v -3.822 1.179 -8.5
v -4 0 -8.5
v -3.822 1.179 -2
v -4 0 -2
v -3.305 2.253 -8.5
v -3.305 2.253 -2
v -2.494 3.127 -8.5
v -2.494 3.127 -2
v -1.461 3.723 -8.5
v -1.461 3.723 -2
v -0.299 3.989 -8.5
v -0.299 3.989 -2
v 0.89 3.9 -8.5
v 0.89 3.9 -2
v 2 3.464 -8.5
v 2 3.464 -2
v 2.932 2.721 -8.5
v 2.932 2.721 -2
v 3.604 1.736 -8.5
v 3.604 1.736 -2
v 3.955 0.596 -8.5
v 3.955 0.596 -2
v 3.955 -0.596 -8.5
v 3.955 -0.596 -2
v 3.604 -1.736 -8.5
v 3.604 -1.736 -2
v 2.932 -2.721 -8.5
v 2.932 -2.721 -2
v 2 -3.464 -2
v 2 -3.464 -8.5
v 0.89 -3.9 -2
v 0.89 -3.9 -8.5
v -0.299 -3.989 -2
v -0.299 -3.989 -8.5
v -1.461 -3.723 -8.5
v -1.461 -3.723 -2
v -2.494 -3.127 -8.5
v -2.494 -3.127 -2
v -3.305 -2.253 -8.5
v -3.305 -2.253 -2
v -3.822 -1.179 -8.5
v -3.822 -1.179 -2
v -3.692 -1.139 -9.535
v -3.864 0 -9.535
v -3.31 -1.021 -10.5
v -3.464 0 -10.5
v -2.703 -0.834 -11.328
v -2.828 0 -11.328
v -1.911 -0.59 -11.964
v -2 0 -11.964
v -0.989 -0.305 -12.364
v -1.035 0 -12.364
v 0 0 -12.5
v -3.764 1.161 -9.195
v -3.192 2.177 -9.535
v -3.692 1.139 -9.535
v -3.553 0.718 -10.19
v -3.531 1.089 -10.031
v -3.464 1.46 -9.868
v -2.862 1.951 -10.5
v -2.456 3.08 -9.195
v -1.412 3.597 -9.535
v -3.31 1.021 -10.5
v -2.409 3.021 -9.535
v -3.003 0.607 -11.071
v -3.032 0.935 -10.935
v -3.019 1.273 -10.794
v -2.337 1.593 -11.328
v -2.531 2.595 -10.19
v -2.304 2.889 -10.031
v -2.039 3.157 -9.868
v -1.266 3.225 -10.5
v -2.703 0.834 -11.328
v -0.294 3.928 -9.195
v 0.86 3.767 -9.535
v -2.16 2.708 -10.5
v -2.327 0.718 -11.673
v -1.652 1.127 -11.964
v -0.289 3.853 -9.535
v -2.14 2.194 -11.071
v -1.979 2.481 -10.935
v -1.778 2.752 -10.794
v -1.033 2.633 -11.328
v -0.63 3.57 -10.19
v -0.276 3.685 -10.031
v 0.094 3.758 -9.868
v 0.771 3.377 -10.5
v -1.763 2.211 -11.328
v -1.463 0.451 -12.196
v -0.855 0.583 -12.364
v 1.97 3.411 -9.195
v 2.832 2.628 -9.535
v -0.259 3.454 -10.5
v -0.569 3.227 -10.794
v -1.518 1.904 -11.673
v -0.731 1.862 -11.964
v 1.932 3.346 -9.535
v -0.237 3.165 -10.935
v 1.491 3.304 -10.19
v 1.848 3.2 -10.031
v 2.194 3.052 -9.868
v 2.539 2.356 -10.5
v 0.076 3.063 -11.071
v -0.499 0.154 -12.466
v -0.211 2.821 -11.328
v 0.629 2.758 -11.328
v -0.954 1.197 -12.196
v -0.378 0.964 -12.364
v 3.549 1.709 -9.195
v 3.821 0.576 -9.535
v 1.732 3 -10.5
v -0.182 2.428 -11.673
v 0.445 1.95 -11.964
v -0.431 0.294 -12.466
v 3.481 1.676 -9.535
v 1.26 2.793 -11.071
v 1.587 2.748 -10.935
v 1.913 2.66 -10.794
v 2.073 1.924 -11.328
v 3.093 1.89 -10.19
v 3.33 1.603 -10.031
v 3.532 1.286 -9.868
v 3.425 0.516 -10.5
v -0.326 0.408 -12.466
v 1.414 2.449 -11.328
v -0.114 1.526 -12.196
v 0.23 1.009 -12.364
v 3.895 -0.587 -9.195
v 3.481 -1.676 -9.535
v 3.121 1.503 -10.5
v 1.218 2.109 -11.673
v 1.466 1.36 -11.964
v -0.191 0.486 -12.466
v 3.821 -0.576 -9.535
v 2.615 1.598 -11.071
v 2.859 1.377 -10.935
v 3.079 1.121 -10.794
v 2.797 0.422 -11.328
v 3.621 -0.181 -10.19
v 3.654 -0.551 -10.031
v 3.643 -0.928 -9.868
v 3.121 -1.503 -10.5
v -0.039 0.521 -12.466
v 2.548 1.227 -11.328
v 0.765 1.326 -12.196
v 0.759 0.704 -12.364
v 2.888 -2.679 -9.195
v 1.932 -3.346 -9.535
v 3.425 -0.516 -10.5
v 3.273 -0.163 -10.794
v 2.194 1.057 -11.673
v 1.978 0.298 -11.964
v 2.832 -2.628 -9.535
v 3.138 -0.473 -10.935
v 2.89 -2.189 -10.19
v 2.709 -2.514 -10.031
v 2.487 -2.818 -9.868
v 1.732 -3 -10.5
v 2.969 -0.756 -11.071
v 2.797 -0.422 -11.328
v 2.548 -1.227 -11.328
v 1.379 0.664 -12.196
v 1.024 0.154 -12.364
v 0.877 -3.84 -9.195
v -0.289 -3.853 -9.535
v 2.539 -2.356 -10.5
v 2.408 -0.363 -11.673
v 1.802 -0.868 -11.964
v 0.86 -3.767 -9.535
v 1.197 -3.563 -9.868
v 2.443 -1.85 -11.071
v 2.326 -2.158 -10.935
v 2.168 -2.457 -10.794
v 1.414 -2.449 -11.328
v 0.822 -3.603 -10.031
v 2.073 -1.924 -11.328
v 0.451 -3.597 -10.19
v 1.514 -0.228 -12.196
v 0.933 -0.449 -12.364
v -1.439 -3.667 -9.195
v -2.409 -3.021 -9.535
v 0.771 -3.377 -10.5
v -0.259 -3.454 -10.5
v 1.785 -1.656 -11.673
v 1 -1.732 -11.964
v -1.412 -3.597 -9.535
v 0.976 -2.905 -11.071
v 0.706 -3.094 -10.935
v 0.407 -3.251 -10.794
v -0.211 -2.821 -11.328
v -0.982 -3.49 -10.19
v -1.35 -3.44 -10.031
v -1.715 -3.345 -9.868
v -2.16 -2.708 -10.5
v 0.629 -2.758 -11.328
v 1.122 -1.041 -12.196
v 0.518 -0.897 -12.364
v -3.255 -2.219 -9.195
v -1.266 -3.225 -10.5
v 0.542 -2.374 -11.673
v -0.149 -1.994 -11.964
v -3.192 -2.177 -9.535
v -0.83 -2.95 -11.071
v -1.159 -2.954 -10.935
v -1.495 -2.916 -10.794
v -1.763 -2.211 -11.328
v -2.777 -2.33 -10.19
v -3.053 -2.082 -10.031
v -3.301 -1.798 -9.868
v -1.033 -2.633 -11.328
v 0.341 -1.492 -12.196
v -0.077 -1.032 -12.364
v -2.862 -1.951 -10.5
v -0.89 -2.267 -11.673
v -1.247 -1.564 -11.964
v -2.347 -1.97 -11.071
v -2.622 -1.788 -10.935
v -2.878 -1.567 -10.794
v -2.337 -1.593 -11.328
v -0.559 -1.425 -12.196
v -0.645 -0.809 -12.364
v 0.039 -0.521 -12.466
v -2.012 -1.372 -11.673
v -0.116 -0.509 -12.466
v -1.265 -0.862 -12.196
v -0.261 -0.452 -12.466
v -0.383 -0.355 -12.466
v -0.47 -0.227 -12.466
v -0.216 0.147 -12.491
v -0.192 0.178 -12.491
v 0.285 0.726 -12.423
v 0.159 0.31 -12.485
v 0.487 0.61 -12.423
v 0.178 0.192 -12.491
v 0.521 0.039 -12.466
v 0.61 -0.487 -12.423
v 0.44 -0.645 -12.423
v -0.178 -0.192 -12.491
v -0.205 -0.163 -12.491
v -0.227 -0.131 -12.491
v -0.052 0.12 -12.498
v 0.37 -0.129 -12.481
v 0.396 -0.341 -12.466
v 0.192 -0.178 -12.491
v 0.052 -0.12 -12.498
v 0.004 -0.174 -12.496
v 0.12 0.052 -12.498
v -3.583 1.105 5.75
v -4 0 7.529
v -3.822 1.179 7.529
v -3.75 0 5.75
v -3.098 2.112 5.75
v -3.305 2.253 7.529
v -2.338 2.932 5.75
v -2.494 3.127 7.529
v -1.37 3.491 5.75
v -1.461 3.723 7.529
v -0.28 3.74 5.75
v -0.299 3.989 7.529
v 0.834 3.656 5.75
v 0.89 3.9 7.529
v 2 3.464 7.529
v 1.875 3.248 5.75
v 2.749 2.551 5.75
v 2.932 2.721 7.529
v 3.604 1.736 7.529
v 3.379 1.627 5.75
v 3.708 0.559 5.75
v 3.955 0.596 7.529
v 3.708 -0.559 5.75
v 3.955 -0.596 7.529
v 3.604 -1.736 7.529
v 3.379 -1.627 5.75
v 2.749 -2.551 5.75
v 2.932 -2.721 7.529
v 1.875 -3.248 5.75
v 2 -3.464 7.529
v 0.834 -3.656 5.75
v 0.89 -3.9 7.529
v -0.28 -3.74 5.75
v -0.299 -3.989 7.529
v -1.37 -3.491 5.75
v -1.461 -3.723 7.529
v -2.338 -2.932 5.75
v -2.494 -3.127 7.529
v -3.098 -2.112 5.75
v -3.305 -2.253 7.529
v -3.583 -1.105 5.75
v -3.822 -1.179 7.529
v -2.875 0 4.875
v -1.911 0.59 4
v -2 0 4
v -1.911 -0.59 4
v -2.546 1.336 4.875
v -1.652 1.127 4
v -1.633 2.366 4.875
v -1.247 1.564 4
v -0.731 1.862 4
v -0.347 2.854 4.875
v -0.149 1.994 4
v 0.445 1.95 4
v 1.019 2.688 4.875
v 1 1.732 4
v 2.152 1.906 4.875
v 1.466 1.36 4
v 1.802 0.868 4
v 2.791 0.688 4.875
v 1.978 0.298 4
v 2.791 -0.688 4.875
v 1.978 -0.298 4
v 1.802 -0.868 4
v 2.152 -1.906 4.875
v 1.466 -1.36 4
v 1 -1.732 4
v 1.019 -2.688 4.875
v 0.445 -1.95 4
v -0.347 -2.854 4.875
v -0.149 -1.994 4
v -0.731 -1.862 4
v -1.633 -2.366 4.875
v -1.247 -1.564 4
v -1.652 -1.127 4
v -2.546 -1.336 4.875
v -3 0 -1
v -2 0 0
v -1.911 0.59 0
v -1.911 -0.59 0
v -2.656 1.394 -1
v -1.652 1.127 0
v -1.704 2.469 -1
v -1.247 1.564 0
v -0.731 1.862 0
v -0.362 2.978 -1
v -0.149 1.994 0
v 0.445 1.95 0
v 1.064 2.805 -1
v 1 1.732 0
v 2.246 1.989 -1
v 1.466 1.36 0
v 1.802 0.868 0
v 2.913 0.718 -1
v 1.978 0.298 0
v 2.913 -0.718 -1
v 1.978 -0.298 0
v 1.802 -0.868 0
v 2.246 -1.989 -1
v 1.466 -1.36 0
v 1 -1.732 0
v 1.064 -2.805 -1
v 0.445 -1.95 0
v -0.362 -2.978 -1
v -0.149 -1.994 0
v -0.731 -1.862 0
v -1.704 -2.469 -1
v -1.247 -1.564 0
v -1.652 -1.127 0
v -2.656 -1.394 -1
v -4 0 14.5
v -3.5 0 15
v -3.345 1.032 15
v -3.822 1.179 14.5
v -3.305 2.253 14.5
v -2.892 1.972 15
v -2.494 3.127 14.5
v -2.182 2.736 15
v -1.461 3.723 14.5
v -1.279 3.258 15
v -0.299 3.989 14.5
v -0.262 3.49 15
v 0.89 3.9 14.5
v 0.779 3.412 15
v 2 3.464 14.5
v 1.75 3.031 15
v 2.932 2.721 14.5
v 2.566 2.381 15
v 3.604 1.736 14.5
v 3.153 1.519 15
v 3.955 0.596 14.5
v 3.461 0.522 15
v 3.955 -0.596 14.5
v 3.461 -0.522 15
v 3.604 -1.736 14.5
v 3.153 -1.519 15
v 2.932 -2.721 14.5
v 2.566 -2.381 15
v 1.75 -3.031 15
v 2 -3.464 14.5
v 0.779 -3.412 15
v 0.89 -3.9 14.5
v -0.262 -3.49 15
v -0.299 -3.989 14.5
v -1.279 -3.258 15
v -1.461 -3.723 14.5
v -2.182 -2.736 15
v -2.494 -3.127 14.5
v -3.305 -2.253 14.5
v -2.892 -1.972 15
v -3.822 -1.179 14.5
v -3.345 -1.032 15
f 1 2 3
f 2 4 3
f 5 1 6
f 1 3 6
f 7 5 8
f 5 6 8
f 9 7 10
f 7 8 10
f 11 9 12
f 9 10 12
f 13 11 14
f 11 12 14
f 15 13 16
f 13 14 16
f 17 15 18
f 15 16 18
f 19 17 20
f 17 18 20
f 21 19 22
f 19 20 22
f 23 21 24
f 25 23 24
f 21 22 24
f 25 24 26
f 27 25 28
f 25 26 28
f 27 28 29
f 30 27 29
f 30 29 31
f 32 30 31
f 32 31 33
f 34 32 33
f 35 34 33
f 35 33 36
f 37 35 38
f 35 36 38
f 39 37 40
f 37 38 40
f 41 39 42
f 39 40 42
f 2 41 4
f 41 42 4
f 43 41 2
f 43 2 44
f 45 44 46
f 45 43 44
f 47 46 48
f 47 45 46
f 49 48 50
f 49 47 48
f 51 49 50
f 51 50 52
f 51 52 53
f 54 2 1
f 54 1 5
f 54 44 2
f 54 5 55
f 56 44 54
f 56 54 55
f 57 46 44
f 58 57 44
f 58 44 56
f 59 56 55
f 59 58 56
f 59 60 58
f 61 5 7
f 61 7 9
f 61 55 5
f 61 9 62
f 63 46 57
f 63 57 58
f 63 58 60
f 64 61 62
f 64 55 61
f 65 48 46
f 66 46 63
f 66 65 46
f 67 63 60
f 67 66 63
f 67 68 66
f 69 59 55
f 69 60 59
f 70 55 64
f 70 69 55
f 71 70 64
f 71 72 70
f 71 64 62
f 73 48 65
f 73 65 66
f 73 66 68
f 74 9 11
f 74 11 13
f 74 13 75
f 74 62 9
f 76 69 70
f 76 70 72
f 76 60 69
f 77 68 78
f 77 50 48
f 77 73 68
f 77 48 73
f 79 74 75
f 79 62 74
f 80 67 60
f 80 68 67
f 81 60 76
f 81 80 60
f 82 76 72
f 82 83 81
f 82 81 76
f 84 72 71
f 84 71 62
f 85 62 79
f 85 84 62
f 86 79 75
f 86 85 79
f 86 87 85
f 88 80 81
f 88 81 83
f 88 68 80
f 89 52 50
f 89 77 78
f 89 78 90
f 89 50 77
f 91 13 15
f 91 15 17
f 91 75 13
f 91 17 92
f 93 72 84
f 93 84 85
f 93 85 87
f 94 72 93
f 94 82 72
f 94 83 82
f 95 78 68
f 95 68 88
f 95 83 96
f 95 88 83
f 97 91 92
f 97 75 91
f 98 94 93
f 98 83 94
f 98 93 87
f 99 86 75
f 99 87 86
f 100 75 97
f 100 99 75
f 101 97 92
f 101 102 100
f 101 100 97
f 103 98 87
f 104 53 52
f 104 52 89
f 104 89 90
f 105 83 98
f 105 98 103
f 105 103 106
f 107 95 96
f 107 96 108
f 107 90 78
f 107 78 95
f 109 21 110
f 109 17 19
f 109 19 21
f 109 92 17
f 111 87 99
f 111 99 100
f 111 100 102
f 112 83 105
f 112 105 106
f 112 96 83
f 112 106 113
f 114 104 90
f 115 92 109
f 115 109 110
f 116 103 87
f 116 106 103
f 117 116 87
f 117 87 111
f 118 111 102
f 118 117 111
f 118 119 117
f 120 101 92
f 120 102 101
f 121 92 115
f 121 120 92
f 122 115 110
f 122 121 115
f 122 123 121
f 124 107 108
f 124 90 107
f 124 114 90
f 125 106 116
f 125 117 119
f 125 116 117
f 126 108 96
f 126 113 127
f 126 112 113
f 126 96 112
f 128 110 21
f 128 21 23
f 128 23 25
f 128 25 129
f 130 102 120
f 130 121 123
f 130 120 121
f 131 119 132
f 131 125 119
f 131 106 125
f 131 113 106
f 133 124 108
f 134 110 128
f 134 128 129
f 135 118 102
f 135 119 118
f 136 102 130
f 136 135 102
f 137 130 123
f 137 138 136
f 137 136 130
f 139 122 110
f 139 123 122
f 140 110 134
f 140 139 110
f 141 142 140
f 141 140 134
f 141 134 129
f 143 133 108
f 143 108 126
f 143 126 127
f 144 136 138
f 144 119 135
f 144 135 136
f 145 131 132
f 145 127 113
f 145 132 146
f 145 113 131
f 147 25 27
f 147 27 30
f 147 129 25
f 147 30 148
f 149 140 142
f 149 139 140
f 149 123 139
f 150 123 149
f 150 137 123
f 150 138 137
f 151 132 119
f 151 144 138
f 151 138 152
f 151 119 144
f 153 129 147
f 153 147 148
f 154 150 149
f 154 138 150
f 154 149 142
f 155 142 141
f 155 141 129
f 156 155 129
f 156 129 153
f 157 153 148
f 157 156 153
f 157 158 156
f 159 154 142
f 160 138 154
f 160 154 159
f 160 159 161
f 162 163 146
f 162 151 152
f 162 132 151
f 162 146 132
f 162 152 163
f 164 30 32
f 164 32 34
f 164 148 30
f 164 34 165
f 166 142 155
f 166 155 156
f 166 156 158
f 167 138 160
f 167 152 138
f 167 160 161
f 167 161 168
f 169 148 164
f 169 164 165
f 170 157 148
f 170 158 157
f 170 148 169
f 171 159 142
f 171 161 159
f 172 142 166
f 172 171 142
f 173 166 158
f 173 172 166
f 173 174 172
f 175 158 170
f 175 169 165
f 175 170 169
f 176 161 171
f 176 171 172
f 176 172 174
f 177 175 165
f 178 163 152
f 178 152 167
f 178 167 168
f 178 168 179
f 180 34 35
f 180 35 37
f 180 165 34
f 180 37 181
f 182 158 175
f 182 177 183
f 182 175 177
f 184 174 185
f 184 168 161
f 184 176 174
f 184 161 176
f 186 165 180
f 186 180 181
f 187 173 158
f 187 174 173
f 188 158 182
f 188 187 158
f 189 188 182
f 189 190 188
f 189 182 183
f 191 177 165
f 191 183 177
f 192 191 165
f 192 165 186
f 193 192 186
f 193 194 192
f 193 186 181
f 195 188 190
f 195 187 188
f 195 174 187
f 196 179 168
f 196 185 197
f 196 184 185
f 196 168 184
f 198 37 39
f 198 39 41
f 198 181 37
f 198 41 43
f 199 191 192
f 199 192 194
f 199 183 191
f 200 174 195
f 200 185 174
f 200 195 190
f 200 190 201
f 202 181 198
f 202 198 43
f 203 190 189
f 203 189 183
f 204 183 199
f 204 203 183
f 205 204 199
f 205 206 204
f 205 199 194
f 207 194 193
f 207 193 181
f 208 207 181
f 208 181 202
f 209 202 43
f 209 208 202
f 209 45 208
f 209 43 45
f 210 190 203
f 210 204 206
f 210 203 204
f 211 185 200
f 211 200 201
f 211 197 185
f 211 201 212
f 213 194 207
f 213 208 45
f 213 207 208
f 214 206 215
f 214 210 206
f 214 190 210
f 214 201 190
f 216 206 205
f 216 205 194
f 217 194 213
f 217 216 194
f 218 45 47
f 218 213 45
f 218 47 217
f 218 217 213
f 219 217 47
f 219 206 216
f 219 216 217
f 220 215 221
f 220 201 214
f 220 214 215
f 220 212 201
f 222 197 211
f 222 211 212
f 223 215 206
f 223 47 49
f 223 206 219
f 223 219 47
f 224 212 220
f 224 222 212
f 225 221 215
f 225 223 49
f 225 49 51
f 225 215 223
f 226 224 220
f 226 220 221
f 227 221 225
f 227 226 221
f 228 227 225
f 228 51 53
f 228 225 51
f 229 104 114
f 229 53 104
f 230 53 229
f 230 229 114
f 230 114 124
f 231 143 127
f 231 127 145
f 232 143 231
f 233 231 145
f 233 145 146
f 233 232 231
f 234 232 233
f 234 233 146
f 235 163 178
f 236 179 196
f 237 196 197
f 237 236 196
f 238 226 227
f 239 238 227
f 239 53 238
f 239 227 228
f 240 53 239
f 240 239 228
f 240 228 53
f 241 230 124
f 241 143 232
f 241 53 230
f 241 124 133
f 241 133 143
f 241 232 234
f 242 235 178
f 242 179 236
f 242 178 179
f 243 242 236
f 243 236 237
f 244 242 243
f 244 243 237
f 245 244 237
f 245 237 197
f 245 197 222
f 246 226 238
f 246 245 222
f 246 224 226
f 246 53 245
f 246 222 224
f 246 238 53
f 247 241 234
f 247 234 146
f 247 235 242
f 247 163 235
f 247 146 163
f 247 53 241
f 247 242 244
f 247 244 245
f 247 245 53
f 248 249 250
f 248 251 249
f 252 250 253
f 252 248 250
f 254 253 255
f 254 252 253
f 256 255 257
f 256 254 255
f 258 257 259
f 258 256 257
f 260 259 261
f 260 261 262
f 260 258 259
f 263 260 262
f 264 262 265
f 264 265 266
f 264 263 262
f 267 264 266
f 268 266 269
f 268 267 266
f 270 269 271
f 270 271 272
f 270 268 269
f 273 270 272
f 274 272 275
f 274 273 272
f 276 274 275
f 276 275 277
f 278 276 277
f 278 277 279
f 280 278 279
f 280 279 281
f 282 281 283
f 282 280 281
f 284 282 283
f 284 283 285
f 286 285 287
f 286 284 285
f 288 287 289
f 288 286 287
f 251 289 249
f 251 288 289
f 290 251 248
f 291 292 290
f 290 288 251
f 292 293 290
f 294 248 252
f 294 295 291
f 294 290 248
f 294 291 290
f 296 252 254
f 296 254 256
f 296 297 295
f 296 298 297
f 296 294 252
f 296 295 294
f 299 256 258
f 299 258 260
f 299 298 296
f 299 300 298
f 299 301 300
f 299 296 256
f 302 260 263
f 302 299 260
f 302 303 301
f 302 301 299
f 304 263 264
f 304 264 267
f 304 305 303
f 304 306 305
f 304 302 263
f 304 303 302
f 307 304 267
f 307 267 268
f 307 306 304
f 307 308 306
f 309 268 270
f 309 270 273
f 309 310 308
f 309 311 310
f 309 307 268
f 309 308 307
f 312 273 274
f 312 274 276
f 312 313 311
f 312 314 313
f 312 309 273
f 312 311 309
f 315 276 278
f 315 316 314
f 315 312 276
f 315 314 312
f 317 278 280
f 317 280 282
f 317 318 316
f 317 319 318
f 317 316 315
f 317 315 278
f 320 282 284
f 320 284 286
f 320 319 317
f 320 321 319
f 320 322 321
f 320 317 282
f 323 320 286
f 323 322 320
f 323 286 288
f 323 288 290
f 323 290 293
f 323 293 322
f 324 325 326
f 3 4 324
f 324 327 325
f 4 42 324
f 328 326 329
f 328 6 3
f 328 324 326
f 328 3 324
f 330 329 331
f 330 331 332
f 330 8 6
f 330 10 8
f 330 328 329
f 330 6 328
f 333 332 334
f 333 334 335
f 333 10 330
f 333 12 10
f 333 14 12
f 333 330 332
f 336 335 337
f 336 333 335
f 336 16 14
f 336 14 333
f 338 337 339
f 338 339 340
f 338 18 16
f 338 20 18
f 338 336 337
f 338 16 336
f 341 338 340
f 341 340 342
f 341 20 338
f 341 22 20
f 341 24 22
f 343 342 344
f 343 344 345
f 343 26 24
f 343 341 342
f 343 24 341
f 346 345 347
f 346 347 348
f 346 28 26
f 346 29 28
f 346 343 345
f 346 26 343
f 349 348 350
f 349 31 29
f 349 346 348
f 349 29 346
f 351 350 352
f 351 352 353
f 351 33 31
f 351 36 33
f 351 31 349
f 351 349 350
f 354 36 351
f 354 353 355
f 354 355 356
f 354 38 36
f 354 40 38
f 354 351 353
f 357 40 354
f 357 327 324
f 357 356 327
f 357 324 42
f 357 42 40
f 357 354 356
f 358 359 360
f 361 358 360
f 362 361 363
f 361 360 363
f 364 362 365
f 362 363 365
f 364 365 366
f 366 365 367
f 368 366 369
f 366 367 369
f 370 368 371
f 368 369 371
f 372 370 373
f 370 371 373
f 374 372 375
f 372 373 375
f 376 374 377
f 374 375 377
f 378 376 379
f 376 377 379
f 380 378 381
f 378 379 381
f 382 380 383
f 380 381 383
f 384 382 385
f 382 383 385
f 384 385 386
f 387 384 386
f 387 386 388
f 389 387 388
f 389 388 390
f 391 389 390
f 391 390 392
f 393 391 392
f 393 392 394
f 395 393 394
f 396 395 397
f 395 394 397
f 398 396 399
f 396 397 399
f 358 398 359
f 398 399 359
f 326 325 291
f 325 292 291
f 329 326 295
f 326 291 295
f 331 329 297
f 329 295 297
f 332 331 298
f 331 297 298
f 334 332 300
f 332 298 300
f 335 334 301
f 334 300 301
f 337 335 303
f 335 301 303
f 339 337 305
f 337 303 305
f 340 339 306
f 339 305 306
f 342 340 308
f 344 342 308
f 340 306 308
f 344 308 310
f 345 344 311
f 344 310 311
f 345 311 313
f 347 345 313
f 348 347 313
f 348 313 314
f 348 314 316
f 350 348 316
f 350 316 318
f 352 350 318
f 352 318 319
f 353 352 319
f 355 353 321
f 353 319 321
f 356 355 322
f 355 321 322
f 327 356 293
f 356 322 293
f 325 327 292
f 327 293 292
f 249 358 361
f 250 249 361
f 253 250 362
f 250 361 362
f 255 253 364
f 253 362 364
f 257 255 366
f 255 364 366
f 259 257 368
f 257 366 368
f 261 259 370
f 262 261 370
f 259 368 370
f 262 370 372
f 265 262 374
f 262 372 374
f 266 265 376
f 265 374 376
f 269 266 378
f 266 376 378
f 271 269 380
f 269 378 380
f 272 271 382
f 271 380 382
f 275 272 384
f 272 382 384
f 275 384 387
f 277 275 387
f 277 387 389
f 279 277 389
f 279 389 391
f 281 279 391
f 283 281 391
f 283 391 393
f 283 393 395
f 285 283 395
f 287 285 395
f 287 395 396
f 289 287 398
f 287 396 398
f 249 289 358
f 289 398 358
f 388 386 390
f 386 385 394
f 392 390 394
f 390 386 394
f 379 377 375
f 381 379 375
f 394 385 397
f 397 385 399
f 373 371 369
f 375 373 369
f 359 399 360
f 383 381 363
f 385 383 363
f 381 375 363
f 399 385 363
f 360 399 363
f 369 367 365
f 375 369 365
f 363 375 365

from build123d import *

# Parameters (mm, degrees)
F0_W     = 4
F0_H     = 7.471158
F0_W_2   = 2
F0_H_2   = 4
F0_H_3   = 6.5
F2_SIZE2 = 0.5
F2_SIZE  = 0.5


with BuildPart() as f1:
    # F0 (on Front) → F1 (revolve)
    with BuildSketch(Plane.XZ):
        with Locations((-2, 11.264421)):
            Rectangle(F0_W, F0_H)
        Polygon((0, 5.75), (0, 7.528842), (-4, 7.528842), (-3.75, 5.75), align=None)
        Polygon((0, 4), (0, 5.75), (-3.75, 5.75), (-2, 4), align=None)
        with Locations((-1, 2)):
            Rectangle(F0_W_2, F0_H_2)
        Polygon((0, -2), (0, 0), (-2, 0), (-4, -2), align=None)
        with Locations((-2, -5.25)):
            Rectangle(F0_W, F0_H_3)
        with BuildLine():
            Line((0, -12.5), (0, -8.5))
            Line((0, -8.5), (-4, -8.5))
            ThreePointArc((-4, -8.5), (-2.828427, -11.328427), (0, -12.5))
        make_face()
    revolve(axis=Axis((0, 0, 1.25), (0, 0, -1)))

    # F2
    f2_edges = [f1.edges().sort_by_distance(p)[0] for p in [
        (4, 0, 15),
    ]]
    chamfer(f2_edges, length=F2_SIZE, length2=F2_SIZE2)


solid = f1.part
